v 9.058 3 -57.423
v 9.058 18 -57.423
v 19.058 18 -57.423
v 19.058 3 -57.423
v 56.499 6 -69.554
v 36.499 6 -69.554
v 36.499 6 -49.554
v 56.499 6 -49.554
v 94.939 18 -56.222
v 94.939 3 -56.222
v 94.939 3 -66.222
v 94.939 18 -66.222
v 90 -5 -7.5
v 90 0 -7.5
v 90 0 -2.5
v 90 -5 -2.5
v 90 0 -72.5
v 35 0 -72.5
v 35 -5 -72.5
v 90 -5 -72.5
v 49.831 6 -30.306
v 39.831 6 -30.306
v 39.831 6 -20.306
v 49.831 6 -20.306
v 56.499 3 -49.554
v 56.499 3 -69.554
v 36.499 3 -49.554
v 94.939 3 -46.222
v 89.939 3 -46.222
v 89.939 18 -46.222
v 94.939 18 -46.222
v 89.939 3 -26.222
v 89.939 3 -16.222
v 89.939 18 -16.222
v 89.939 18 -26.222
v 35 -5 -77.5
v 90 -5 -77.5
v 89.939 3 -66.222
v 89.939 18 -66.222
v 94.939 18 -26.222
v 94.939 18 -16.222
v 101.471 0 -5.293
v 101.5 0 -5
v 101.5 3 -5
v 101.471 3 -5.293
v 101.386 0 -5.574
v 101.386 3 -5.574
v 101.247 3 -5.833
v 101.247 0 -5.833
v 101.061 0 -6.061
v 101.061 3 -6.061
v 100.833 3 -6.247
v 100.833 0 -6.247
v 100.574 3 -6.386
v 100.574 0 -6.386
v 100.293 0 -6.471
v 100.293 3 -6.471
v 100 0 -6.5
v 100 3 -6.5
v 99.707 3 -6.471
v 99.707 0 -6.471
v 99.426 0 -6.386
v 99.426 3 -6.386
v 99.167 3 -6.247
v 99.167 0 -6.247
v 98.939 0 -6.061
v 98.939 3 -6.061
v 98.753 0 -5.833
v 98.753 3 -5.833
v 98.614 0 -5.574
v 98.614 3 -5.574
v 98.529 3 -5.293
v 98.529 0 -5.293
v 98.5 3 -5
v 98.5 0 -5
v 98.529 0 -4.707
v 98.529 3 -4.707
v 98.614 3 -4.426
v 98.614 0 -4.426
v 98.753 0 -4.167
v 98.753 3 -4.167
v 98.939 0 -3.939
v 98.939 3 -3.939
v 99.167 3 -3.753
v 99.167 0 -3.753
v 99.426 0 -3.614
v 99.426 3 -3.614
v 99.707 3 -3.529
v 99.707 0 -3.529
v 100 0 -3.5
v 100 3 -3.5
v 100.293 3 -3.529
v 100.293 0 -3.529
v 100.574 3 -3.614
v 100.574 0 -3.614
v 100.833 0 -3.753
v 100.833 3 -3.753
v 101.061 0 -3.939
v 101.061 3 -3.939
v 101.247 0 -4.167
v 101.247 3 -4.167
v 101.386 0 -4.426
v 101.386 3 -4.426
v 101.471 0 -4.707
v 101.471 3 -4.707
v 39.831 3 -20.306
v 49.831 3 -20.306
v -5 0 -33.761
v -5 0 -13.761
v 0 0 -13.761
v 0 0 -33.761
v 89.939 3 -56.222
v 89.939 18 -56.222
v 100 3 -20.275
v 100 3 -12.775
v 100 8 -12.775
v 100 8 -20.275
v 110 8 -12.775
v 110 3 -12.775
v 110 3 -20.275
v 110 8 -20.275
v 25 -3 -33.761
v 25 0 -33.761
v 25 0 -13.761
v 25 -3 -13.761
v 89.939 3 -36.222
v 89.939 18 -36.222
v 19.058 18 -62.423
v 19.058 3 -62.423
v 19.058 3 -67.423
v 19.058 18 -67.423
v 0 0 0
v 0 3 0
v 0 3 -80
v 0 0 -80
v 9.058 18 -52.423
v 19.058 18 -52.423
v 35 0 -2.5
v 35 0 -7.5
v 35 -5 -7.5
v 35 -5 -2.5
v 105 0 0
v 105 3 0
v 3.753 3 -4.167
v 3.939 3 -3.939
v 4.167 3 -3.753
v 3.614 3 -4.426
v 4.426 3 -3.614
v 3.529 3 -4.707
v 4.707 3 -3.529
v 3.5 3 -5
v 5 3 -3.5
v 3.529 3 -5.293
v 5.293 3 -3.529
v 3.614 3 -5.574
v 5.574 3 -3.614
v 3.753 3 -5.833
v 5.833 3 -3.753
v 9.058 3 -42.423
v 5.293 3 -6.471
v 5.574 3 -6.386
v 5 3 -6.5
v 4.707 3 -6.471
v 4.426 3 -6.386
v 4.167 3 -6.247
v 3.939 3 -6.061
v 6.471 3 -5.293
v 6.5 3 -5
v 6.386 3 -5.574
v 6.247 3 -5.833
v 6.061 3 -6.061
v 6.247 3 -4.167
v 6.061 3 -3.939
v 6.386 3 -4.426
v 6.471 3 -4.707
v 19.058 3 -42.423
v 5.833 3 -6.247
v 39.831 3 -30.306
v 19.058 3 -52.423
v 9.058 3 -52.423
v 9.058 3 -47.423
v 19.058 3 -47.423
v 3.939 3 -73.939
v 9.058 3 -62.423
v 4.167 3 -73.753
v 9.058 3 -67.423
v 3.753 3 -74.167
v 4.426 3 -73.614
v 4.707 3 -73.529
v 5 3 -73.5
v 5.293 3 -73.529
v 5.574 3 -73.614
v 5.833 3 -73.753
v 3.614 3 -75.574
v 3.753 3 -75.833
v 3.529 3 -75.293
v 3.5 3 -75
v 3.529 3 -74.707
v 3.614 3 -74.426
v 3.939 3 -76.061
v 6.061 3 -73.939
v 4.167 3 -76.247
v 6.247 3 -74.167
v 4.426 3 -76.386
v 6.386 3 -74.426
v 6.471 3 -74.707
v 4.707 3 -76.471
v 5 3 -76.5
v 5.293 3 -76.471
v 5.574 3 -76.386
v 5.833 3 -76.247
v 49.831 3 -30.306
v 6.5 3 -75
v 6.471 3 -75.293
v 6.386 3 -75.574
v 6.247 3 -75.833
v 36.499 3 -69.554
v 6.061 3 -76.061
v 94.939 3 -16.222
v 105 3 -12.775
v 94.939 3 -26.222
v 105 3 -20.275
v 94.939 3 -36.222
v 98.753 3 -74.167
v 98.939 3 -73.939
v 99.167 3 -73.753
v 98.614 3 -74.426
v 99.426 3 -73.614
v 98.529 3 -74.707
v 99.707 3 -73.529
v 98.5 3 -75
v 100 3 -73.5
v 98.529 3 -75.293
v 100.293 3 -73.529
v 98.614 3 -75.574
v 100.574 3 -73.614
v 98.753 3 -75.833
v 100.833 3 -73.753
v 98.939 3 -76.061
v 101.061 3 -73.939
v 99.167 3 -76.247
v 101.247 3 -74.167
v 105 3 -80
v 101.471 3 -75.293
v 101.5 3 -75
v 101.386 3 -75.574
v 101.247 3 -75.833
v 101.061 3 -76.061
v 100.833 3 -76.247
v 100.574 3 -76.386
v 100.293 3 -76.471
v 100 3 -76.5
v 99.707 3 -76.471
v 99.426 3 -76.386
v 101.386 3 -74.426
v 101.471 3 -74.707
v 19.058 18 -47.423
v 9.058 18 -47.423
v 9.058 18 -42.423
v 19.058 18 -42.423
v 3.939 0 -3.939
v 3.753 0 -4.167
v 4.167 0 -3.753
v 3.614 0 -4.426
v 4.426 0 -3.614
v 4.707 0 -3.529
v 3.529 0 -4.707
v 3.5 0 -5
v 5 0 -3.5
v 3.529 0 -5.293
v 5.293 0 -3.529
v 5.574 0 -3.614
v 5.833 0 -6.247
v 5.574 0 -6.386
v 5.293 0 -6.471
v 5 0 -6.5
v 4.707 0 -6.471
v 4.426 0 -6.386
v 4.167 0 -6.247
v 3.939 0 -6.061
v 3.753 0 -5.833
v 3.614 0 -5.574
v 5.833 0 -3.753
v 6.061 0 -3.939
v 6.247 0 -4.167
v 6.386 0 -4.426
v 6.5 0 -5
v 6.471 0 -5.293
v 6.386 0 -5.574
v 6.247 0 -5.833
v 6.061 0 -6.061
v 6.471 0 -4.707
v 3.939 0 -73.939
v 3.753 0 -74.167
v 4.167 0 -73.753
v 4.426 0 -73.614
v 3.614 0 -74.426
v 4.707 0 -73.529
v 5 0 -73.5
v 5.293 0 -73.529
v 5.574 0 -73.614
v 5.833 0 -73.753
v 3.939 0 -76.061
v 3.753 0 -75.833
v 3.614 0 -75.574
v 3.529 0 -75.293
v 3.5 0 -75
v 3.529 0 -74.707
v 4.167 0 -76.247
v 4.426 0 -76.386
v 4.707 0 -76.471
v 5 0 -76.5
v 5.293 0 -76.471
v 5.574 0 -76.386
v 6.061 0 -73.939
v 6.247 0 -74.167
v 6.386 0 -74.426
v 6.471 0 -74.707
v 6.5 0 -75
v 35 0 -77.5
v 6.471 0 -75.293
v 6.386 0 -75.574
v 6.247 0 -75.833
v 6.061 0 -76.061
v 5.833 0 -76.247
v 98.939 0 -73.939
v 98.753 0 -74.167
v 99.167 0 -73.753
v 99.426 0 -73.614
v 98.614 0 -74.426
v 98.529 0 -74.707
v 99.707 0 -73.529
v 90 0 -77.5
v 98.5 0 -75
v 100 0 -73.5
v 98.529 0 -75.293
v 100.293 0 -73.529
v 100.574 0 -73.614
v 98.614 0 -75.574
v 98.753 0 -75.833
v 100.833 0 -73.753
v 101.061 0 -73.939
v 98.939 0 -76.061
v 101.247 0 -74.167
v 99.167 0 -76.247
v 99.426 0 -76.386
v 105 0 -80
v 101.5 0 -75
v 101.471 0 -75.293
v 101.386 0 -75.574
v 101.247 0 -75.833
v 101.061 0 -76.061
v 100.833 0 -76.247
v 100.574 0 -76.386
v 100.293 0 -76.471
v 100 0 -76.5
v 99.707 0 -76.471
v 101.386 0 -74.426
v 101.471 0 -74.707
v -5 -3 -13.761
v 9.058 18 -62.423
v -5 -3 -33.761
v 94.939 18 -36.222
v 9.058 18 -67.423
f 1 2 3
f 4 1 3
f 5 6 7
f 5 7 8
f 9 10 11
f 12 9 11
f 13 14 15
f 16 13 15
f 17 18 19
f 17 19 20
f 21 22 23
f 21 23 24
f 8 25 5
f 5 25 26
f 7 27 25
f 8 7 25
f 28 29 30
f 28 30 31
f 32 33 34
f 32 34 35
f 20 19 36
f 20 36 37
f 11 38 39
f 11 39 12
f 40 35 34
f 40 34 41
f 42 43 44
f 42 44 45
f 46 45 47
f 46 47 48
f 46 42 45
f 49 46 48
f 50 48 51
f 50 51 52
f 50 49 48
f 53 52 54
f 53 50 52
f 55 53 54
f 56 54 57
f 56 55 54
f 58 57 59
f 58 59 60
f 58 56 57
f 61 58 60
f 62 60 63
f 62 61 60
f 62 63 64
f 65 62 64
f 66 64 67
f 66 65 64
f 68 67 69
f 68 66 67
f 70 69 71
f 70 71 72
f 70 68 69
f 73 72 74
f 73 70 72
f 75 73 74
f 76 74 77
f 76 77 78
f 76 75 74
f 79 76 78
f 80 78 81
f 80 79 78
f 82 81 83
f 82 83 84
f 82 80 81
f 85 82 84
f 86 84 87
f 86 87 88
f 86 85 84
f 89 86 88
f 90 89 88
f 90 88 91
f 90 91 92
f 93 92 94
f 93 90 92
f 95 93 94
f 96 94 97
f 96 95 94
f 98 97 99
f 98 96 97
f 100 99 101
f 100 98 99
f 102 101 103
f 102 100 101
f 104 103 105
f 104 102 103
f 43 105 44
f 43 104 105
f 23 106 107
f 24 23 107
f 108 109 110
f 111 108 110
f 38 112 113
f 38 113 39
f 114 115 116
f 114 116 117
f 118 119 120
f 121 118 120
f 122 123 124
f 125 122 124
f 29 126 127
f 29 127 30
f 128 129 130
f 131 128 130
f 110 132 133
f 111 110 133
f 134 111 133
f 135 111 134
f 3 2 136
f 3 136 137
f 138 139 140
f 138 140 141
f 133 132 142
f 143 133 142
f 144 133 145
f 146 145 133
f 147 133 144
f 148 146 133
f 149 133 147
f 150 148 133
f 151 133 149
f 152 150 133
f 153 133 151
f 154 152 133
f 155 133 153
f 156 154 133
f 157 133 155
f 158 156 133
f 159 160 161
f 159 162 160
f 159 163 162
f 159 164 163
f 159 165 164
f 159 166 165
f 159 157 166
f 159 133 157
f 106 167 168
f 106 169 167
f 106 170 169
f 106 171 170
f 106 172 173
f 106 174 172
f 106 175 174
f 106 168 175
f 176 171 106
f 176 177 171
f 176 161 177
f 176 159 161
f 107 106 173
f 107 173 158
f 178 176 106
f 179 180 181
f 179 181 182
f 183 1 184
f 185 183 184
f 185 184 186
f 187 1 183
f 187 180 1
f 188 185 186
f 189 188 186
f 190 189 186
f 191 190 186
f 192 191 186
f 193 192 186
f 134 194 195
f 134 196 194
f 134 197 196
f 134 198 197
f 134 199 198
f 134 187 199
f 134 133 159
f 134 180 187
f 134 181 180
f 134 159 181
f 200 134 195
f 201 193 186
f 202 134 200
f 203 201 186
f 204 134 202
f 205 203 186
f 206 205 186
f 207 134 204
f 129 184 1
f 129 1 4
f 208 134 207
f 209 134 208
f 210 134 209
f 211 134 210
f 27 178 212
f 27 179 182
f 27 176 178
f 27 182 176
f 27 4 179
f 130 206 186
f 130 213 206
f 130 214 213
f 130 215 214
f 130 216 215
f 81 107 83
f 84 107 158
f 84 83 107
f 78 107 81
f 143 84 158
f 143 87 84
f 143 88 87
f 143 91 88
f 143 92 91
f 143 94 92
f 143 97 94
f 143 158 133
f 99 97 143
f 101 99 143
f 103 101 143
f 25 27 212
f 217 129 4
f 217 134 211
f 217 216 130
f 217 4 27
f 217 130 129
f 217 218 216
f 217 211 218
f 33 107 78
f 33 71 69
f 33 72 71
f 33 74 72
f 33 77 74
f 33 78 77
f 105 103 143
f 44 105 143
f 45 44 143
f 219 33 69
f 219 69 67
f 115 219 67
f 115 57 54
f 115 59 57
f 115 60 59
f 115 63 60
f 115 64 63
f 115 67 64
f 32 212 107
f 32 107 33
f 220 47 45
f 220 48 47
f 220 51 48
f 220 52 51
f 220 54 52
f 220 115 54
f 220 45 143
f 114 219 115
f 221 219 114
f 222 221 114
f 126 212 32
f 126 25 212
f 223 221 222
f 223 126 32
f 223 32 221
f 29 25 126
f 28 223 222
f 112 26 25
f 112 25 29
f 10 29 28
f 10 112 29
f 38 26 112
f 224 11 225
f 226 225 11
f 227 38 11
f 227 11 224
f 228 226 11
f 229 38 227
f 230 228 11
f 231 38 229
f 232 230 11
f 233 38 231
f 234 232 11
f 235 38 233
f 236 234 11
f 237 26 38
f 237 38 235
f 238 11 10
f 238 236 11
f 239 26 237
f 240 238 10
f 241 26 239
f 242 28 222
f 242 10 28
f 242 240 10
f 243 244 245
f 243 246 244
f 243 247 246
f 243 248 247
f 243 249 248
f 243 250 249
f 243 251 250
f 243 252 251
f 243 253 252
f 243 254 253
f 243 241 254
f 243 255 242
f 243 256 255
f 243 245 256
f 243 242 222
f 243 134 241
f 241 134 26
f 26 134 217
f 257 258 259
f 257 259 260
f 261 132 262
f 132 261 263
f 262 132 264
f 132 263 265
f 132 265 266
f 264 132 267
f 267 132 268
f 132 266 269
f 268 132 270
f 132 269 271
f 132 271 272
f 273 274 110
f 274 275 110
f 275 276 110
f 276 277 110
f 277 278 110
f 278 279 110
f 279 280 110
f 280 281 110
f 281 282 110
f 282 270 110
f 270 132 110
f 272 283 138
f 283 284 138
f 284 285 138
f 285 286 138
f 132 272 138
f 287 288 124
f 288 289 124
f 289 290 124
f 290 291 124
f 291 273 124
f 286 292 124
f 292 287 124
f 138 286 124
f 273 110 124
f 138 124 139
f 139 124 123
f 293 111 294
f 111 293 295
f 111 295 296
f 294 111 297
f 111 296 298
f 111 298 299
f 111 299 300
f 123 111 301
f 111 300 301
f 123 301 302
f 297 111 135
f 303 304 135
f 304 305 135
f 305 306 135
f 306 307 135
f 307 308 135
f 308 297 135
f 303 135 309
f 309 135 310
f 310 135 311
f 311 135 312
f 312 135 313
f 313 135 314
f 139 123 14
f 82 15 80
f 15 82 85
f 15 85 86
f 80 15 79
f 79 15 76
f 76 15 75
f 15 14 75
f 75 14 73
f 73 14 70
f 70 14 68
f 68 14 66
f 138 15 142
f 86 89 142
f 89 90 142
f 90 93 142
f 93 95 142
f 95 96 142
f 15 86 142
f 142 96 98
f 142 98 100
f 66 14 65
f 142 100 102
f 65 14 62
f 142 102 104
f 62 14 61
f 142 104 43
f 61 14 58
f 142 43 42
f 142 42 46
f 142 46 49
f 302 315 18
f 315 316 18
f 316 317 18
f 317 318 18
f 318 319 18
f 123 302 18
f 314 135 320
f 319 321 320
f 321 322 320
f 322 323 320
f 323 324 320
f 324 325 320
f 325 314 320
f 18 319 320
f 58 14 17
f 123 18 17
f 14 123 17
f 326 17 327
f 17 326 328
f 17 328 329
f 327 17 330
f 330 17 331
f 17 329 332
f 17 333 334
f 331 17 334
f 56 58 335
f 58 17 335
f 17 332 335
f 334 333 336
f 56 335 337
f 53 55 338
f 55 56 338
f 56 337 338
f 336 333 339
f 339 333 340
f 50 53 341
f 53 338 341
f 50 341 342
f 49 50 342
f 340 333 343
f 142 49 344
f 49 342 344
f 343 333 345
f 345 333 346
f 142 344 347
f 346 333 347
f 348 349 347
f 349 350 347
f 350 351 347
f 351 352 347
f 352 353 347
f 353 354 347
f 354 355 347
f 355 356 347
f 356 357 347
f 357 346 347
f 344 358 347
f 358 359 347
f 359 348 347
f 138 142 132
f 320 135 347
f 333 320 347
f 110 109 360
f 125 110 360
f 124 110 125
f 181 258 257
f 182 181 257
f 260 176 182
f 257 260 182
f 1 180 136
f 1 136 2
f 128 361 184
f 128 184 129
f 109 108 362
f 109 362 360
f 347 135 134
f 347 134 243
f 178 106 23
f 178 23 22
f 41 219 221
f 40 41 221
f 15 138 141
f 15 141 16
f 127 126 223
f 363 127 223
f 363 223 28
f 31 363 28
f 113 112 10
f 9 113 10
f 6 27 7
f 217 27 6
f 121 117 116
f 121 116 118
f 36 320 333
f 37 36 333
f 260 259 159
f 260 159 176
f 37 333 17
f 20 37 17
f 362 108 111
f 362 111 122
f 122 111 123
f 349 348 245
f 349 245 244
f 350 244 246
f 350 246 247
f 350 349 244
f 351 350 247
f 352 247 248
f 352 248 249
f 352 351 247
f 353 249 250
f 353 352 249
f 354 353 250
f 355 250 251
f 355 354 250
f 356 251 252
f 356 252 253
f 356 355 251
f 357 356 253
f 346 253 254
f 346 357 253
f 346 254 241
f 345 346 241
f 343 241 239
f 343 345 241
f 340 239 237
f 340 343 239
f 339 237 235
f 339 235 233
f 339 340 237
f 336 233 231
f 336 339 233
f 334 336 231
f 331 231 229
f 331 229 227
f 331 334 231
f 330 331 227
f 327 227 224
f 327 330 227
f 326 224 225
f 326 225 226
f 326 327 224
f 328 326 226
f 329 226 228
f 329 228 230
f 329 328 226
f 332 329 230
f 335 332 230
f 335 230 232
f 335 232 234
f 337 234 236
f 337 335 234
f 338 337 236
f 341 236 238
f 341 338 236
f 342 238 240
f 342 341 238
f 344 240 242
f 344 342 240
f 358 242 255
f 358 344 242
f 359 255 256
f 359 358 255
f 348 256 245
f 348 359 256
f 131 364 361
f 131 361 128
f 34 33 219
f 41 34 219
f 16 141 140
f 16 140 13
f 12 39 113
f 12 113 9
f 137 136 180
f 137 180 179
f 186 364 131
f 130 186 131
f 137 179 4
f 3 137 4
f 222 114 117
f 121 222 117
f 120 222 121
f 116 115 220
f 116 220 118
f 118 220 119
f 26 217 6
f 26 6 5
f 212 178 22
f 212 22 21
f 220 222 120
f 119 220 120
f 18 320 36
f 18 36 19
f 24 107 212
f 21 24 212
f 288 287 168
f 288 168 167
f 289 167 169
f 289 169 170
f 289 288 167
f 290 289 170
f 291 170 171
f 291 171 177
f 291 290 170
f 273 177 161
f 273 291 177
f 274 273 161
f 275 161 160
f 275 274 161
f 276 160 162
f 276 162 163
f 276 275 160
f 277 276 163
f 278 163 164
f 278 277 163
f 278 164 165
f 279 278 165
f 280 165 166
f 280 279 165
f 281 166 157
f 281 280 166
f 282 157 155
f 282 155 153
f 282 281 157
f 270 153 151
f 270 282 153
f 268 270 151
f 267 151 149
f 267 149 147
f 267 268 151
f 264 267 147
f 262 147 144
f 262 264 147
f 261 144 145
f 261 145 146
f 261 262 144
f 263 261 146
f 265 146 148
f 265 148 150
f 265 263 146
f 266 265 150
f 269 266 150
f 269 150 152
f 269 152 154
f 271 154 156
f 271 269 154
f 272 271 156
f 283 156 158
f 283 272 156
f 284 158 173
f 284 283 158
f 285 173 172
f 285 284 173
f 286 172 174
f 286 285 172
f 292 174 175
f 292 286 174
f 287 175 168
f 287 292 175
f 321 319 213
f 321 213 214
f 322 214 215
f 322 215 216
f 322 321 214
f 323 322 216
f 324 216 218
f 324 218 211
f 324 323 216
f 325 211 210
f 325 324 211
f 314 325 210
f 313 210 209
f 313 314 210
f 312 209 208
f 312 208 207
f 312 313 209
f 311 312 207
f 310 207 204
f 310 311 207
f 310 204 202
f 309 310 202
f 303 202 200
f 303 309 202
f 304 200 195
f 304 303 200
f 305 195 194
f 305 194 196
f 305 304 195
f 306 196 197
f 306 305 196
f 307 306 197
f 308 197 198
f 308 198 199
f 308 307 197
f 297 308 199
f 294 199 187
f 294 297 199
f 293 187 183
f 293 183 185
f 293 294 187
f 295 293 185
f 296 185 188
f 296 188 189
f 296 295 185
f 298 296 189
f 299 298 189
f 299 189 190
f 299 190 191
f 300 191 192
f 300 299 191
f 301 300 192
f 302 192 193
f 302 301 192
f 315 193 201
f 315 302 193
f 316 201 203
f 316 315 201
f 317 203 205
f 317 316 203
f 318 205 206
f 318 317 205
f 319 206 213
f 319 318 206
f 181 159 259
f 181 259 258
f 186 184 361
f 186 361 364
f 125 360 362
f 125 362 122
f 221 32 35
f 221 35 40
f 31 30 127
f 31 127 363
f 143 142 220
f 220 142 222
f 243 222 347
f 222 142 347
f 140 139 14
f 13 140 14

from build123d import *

# Parameters (mm, degrees)
ESQUISSE1_W      = 105
ESQUISSE1_H      = 80
ESQUISSE1_R      = 1.5
EXTRUSION1_DEPTH = 3
ESQUISSE2_W      = 20
ESQUISSE2_H      = 20
ESQUISSE2_W_2    = 10
ESQUISSE2_H_2    = 10
EXTRUSION2_DEPTH = 3
ESQUISSE3_W      = 5
ESQUISSE3_H      = 10
ESQUISSE3_W_2    = 10
ESQUISSE3_H_2    = 5
EXTRUSION3_DEPTH = 15
ESQUISSE4_W      = 55
ESQUISSE4_H      = 5
EXTRUSION4_DEPTH = 5
ESQUISSE5_W      = 30
ESQUISSE5_H      = 20
EXTRUSION5_DEPTH = 3
ESQUISSE6_W      = 10
ESQUISSE6_H      = 7.5
EXTRUSION6_DEPTH = 5


with BuildPart() as part:
    # Esquisse1 → Extrusion1 (new body)
    with BuildSketch(Plane(origin=(0, 0, 0), x_dir=(1, 0, 0), z_dir=(0, 1, 0))):
        with Locations((52.5, 40)):
            Rectangle(ESQUISSE1_W, ESQUISSE1_H)
        with Locations((5, 75)):
            Circle(ESQUISSE1_R, mode=Mode.SUBTRACT)
        with Locations((100, 75)):
            Circle(ESQUISSE1_R, mode=Mode.SUBTRACT)
        with Locations((100, 5)):
            Circle(ESQUISSE1_R, mode=Mode.SUBTRACT)
        with Locations((5, 5)):
            Circle(ESQUISSE1_R, mode=Mode.SUBTRACT)
    extrude(amount=EXTRUSION1_DEPTH)

    # Esquisse2 → Extrusion2 (add)
    with BuildSketch(Plane(origin=(0, 3, 0), x_dir=(1, 0, 0), z_dir=(0, 1, 0))):
        with Locations((46.498714715, 59.553685436)):
            Rectangle(ESQUISSE2_W, ESQUISSE2_H)
        with Locations((44.830735419, 25.305948149)):
            Rectangle(ESQUISSE2_W_2, ESQUISSE2_H_2)
    extrude(amount=EXTRUSION2_DEPTH)

    # Esquisse3 → Extrusion3 (add)
    with BuildSketch(Plane(origin=(0, 3, 0), x_dir=(1, 0, 0), z_dir=(0, 1, 0))):
        with Locations((92.438953264, 61.221664733)):
            Rectangle(ESQUISSE3_W, ESQUISSE3_H)
        with Locations((14.058039322, 64.92274654)):
            Rectangle(ESQUISSE3_W_2, ESQUISSE3_H_2)
        with Locations((14.058039322, 54.92274654)):
            Rectangle(ESQUISSE3_W_2, ESQUISSE3_H_2)
        with Locations((14.058039322, 44.92274654)):
            Rectangle(ESQUISSE3_W_2, ESQUISSE3_H_2)
        with Locations((92.438953264, 41.221664733)):
            Rectangle(ESQUISSE3_W, ESQUISSE3_H)
        with Locations((92.438953264, 21.221664733)):
            Rectangle(ESQUISSE3_W, ESQUISSE3_H)
    extrude(amount=EXTRUSION3_DEPTH)

    # Esquisse4 → Extrusion4 (add)
    with BuildSketch(Plane.XZ):
        with Locations((62.5, -5)):
            Rectangle(ESQUISSE4_W, ESQUISSE4_H)
        with Locations((62.5, -75)):
            Rectangle(ESQUISSE4_W, ESQUISSE4_H)
    extrude(amount=EXTRUSION4_DEPTH)

    # Esquisse5 → Extrusion5 (add)
    with BuildSketch(Plane.XZ):
        with Locations((10, -23.761311795)):
            Rectangle(ESQUISSE5_W, ESQUISSE5_H)
    extrude(amount=EXTRUSION5_DEPTH)

    # Esquisse6 → Extrusion6 (add)
    with BuildSketch(Plane(origin=(0, 3, 0), x_dir=(1, 0, 0), z_dir=(0, 1, 0))):
        with Locations((105, 16.524993395)):
            Rectangle(ESQUISSE6_W, ESQUISSE6_H)
    extrude(amount=EXTRUSION6_DEPTH)


solid = part.part
